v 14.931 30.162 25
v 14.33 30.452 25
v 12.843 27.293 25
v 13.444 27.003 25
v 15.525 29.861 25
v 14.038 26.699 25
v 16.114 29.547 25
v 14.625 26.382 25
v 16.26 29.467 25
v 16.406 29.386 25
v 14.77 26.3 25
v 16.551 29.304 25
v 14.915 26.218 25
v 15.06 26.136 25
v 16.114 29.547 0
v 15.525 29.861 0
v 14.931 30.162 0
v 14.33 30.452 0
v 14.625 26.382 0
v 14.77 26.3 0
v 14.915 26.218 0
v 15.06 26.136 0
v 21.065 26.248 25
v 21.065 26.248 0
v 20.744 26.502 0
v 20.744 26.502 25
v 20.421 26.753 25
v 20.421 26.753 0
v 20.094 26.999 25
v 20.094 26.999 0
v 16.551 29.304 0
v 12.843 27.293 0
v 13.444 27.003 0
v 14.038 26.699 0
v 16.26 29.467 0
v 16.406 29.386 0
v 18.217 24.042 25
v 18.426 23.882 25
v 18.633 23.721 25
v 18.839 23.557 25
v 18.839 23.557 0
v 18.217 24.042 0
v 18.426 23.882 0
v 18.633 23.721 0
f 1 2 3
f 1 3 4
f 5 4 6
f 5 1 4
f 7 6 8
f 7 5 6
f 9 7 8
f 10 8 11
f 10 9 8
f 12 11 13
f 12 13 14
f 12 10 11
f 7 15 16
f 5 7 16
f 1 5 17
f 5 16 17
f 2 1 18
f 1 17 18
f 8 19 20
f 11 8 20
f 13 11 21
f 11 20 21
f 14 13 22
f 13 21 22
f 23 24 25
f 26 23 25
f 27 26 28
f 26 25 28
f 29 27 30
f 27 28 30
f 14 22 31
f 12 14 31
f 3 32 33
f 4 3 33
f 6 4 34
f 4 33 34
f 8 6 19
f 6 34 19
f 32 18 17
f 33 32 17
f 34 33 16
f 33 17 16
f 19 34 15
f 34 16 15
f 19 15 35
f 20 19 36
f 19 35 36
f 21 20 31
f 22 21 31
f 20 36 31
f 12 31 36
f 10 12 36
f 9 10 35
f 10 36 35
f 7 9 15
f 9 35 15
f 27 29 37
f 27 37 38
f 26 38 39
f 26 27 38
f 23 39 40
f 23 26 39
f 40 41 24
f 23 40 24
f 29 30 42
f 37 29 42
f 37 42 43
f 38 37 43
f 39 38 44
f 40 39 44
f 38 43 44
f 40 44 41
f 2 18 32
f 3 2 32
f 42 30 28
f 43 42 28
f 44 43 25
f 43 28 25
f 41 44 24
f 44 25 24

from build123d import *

# Parameters (mm, degrees)
F1_DEPTH = 25


with BuildPart() as f1:
    # F0 (on Top) → F1 (new body)
    with BuildSketch(Plane.XY):
        with BuildLine():
            Line((18.839471, 23.557394), (21.065249, 26.247898))
            ThreePointArc((21.065249, 26.247898), (20.582876, 26.627845), (20.093651, 26.998927))
            Line((20.093651, 26.998927), (18.217083, 24.04193))
            ThreePointArc((18.217083, 24.04193), (18.529861, 23.801696), (18.839471, 23.557394))
        make_face()
        with BuildLine():
            Line((15.060183, 26.135558), (16.551344, 29.304435))
            ThreePointArc((16.551344, 29.304435), (16.333208, 29.426573), (16.114171, 29.547087))
            Line((16.114171, 29.547087), (14.624667, 26.381729))
            ThreePointArc((14.624667, 26.381729), (14.842935, 26.259546), (15.060183, 26.135558))
        make_face()
        with BuildLine():
            Line((14.624667, 26.381729), (16.114171, 29.547087))
            ThreePointArc((16.114171, 29.547087), (15.228736, 30.013039), (14.329842, 30.452463))
            Line((14.329842, 30.452463), (12.843274, 27.293347))
            ThreePointArc((12.843274, 27.293347), (13.741532, 26.852315), (14.624667, 26.381729))
        make_face()
    extrude(amount=F1_DEPTH)


solid = f1.part
